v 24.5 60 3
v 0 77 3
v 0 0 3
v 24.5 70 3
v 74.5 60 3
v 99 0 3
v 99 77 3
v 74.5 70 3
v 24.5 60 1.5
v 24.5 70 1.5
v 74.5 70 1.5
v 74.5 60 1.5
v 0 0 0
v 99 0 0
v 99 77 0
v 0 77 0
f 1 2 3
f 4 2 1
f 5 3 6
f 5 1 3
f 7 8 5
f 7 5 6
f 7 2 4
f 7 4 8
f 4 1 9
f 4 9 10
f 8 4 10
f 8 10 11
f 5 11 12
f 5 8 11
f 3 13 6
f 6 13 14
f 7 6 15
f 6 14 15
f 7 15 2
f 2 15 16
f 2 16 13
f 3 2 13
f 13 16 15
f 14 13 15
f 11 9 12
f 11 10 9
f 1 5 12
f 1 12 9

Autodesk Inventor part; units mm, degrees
ref_plane "YZ Plane" through (0, 0, 0) normal (1, 0, 0) x (0, 1, 0)
ref_plane "XZ Plane" through (0, 0, 0) normal (0, 1, 0) x (-1, 0, 0)
ref_plane "XY Plane" through (0, 0, 0) normal (0, 0, 1) x (1, 0, 0)
sketch "Sketch1" plane through (0, 0, 0) normal (0, 0, 1) x (1, 0, 0)
  line L0 (0, 0) -> (99, 0)
  line L1 (99, 0) -> (99, 77)
  line L2 (99, 77) -> (0, 77)
  line L3 (0, 77) -> (0, 0)
  dimension "d1" = 77
  dimension "d51" = 99
extrude "Extrusion1" add sketch "Sketch1" along normal blind 3
sketch "Sketch4" plane through (0, 0, 3) normal (0, 0, 1) x (1, 0, 0)
  line L0 (24.5, 70) -> (74.5, 70)
  line L1 (74.5, 70) -> (74.5, 60)
  line L2 (74.5, 60) -> (24.5, 60)
  line L3 (24.5, 60) -> (24.5, 70)
  line L4 (24.5, 70) -> (74.5, 60) construction
  line L5 (74.5, 70) -> (24.5, 60) construction
  line L6 (0, 77) -> (49.5, 77)
  line L7 (99, 77) -> (0, 77) projected
  point P0 (0, 0)
  dimension "d47" = 50
  dimension "d48" = 10
extrude "Extrusion2" cut sketch "Sketch4" against normal blind 1.5
properties part number "DoosjeVoorkant" material "Wood (Cherry)"
